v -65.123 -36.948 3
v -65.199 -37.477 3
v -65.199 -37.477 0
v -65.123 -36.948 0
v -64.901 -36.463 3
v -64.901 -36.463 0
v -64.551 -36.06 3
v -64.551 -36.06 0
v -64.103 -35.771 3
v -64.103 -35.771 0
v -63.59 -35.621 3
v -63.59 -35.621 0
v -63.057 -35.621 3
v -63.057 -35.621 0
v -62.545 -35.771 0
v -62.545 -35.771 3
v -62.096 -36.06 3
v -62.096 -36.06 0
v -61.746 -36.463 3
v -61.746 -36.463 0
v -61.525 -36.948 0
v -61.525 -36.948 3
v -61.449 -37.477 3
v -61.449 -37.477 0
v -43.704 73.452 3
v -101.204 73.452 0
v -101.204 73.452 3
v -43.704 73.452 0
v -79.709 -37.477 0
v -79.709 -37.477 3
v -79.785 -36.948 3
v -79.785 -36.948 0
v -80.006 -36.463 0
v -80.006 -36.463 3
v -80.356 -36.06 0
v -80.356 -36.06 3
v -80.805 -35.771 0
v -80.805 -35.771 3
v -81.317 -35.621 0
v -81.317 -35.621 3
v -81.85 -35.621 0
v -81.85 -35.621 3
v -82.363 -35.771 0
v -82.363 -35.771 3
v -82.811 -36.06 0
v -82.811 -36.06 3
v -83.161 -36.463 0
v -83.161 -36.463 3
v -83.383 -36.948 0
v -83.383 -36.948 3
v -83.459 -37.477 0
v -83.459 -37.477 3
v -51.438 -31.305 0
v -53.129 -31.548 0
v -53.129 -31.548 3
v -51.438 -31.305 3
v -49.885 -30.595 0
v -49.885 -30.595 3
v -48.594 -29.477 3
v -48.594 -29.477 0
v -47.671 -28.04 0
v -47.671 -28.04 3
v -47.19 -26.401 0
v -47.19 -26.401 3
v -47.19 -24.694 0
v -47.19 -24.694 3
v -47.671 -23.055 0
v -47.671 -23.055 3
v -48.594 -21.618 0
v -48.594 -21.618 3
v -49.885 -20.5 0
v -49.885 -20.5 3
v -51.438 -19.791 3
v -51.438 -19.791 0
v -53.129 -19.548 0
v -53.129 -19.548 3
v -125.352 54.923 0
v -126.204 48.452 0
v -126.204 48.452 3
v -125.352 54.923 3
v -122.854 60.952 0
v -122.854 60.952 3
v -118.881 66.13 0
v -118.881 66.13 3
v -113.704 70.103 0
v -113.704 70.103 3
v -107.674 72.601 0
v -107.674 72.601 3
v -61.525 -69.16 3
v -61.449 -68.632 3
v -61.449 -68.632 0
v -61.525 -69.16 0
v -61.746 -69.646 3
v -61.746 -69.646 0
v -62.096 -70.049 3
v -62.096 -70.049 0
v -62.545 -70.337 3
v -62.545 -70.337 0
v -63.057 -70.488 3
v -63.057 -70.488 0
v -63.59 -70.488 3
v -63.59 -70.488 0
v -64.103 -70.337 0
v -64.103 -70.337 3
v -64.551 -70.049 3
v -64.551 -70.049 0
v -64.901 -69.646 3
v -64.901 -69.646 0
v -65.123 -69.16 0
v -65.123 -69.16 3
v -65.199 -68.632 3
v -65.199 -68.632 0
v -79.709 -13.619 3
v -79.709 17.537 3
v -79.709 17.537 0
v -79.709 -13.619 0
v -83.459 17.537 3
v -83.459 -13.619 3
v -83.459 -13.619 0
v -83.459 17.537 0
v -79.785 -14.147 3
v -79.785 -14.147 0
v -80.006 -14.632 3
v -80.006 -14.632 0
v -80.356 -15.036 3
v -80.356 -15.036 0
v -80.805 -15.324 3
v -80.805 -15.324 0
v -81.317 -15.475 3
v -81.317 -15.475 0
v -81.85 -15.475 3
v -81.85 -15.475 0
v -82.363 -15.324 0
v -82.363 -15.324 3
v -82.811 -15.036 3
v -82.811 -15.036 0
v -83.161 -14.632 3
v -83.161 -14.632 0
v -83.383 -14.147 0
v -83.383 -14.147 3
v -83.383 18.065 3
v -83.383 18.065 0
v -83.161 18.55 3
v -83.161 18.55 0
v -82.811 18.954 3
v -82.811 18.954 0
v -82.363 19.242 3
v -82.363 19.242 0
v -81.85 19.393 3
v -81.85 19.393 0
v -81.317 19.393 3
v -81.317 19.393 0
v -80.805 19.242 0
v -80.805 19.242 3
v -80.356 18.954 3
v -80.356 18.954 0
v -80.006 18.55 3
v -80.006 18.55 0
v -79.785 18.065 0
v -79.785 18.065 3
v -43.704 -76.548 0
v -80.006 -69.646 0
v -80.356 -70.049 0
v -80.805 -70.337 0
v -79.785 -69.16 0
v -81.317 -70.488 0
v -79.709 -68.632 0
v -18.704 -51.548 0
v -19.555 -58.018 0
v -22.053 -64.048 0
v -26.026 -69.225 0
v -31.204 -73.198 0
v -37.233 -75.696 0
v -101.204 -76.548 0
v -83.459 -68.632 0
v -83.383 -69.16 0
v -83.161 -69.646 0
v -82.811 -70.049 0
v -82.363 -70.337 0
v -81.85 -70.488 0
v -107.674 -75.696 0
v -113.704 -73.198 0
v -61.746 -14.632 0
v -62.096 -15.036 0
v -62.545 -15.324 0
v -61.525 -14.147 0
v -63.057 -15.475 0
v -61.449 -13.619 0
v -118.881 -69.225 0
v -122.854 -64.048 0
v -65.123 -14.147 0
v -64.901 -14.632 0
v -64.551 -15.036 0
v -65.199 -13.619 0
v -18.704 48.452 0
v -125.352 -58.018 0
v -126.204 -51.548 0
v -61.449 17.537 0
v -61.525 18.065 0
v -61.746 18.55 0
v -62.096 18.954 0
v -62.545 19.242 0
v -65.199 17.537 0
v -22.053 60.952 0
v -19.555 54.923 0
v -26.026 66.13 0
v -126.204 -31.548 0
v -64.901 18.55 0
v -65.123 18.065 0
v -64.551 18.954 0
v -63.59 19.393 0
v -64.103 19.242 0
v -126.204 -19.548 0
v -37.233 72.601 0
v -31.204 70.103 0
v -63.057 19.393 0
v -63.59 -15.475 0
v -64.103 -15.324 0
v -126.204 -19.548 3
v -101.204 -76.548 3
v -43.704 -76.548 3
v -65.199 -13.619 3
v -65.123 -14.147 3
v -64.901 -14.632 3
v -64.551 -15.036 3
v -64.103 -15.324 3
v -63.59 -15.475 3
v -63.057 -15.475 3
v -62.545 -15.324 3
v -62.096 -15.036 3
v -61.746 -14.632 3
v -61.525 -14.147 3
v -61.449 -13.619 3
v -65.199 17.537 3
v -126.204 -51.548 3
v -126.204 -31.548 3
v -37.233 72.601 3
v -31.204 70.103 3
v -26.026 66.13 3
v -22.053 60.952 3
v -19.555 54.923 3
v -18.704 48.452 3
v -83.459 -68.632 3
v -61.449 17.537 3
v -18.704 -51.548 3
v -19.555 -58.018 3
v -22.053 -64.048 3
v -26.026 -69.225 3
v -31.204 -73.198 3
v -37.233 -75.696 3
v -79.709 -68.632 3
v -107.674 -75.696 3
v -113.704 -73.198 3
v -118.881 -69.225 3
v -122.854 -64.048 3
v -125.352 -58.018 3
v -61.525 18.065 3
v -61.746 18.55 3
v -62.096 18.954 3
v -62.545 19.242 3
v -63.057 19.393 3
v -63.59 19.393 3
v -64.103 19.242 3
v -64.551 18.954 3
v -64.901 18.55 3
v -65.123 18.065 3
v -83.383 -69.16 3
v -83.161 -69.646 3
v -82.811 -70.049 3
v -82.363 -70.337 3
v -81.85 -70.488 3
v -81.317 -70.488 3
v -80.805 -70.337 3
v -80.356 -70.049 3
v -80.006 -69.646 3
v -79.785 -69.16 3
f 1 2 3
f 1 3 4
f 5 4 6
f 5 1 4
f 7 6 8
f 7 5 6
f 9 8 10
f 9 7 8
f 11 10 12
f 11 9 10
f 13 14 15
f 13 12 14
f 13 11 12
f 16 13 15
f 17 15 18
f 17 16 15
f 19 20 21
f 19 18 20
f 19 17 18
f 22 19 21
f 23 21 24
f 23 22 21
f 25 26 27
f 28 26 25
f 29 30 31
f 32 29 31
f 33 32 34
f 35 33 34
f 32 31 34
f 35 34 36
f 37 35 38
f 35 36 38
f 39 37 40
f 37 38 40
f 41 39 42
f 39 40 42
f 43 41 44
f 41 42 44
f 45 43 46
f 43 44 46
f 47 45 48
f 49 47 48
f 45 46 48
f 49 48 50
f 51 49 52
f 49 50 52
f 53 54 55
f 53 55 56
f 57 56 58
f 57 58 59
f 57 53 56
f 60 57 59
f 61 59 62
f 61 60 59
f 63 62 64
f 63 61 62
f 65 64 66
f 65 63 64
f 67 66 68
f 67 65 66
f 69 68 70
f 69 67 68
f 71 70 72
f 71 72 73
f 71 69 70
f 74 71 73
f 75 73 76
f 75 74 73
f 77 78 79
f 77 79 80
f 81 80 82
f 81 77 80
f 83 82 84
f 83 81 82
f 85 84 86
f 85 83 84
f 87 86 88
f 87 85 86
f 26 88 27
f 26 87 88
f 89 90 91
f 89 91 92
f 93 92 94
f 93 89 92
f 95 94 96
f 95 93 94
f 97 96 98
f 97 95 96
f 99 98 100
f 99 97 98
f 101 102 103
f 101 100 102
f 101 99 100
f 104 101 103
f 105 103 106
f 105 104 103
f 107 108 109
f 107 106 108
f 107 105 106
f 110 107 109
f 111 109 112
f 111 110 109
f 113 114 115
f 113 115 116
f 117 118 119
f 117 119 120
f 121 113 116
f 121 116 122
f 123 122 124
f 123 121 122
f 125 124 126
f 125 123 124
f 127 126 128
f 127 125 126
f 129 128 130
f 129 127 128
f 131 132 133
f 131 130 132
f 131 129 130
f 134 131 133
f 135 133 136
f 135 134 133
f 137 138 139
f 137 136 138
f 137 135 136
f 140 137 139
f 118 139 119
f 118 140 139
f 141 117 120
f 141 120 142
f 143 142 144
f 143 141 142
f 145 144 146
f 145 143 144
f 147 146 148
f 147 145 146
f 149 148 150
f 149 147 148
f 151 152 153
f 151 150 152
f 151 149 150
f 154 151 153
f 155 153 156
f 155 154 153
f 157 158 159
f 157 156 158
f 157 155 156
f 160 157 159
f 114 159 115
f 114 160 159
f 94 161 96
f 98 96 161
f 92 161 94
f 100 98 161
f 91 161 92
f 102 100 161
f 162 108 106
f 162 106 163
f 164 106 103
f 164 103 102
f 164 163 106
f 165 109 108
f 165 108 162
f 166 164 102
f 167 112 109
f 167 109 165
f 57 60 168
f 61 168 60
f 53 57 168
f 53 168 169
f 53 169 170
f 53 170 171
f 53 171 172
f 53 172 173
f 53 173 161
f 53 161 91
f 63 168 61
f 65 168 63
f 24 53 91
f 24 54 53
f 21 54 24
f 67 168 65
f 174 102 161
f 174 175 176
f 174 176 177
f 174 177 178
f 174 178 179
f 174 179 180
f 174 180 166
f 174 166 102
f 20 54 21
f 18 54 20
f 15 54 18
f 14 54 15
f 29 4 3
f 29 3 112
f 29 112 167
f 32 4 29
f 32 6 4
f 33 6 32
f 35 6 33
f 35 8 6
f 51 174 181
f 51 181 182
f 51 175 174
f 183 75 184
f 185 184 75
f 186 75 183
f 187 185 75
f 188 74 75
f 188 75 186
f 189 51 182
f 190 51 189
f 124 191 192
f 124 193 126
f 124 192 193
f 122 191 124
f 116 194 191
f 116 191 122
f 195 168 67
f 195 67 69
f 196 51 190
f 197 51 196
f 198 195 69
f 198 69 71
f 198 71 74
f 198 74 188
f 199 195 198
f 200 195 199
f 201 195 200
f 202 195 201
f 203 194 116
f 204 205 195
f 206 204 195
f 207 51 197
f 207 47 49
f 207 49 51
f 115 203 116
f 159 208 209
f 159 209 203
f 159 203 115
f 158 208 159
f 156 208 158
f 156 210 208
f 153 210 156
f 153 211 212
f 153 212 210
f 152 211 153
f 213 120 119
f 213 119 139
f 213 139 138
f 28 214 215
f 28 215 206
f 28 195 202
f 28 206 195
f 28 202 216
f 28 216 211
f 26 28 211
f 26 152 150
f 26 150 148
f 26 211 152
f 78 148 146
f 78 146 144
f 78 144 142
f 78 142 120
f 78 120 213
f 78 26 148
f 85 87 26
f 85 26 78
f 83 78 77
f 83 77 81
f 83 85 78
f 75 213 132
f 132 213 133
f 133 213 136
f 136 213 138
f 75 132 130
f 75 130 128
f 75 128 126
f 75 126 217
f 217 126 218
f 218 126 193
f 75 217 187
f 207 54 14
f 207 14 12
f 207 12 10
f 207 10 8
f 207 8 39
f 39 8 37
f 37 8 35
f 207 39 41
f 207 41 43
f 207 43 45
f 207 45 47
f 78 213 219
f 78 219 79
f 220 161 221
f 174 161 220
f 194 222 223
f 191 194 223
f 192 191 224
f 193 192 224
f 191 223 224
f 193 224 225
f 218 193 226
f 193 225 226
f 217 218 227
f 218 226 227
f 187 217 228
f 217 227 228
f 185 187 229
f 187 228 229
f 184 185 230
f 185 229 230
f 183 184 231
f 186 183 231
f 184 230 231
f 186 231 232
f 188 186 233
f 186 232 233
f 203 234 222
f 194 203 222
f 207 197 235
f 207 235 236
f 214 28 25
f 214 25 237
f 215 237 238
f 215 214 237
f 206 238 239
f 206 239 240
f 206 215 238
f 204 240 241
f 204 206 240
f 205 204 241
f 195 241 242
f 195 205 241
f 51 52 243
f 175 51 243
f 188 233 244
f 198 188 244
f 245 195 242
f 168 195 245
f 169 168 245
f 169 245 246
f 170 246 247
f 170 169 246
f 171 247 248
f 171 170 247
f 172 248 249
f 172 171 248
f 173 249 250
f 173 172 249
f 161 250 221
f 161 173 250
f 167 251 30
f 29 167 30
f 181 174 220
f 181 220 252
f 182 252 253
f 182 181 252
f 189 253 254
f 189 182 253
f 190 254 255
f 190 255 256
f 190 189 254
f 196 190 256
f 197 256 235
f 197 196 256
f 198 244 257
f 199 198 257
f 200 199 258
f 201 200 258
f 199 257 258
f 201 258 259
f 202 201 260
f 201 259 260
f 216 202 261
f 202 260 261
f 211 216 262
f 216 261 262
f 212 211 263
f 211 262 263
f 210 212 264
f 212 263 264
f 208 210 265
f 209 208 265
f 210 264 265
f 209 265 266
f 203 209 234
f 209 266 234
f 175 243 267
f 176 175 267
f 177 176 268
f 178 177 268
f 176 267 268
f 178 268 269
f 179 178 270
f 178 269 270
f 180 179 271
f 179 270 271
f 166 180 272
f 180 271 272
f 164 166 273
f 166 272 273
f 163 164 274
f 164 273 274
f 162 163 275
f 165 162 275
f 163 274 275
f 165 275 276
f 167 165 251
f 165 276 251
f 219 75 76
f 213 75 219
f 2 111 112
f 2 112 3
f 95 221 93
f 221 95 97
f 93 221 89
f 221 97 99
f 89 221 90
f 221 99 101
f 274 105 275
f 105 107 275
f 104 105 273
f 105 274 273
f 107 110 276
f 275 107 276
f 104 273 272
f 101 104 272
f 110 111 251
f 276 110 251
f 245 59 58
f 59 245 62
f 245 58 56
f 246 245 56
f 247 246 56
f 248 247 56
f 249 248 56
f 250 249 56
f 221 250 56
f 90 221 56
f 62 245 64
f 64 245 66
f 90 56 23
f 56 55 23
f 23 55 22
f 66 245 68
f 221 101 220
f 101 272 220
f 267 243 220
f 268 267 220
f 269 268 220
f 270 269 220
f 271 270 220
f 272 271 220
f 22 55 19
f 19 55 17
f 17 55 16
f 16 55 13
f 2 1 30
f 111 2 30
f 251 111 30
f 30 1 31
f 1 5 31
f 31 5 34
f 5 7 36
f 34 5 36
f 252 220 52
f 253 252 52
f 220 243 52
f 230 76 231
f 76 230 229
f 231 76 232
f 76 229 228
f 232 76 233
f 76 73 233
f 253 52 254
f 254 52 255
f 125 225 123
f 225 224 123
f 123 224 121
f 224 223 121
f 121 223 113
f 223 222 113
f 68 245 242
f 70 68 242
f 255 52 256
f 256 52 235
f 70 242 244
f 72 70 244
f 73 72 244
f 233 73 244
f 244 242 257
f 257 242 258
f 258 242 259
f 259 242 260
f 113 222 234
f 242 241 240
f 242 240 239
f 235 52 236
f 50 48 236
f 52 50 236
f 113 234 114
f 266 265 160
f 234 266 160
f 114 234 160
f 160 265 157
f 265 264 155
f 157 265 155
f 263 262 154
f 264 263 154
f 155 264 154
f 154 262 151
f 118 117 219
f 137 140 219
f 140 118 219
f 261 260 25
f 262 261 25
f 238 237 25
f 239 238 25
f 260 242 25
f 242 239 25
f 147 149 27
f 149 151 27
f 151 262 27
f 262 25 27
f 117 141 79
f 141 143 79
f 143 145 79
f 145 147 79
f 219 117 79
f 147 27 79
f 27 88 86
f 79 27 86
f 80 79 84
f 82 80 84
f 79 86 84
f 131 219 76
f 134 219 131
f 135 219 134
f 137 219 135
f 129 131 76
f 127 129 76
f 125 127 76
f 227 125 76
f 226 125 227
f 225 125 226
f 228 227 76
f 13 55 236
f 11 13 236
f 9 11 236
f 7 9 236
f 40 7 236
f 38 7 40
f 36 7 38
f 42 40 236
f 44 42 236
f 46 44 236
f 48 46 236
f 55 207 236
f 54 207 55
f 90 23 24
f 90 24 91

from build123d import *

# Parameters (mm, degrees)
BOSS_EXTRUDE1_DEPTH = 3
CUT_EXTRUDE1_DEPTH  = 10


with BuildPart() as part:
    # Sketch2 → Boss-Extrude1 (new body)
    with BuildSketch(Plane.XY):
        with BuildLine():
            Line((-53.128634422, -19.547588701), (-62.746809975, -19.547588701))
            Line((-62.746809975, -19.547588701), (-126.203620945, -19.547588701))
            Line((-126.203620945, -19.547588701), (-126.203620945, 48.452411299))
            ThreePointArc((-126.203620945, 48.452411299), (-118.881290474, 66.130080829), (-101.203620945, 73.452411299))
            Line((-101.203620945, 73.452411299), (-43.703620945, 73.452411299))
            ThreePointArc((-43.703620945, 73.452411299), (-26.025951415, 66.130080829), (-18.703620945, 48.452411299))
            Line((-18.703620945, 48.452411299), (-18.703620945, -51.547588701))
            ThreePointArc((-18.703620945, -51.547588701), (-26.025951415, -69.225258231), (-43.703620945, -76.547588701))
            Line((-43.703620945, -76.547588701), (-101.203620945, -76.547588701))
            ThreePointArc((-101.203620945, -76.547588701), (-118.881290474, -69.225258231), (-126.203620945, -51.547588701))
            Line((-126.203620945, -51.547588701), (-126.203620945, -31.547588701))
            Line((-126.203620945, -31.547588701), (-62.746809975, -31.547588701))
            Line((-62.746809975, -31.547588701), (-53.128634422, -31.547588701))
            ThreePointArc((-53.128634422, -31.547588701), (-47.128634422, -25.547588701), (-53.128634422, -19.547588701))
        make_face()
    extrude(amount=BOSS_EXTRUDE1_DEPTH)

    # Sketch3 → Cut-Extrude1 (cut)
    with BuildSketch(Plane.XY.offset(3)):
        with BuildLine():
            Line((-61.448620945, -37.476562772), (-61.448620945, -68.6318397))
            ThreePointArc((-61.448620945, -68.6318397), (-63.323620945, -70.5068397), (-65.198620945, -68.6318397))
            Line((-65.198620945, -68.6318397), (-65.198620945, -37.476562772))
            ThreePointArc((-65.198620945, -37.476562772), (-63.323620945, -35.601562772), (-61.448620945, -37.476562772))
        make_face()
        with BuildLine():
            Line((-83.458620945, -37.476562772), (-83.458620945, -68.6318397))
            ThreePointArc((-83.458620945, -68.6318397), (-81.583620945, -70.5068397), (-79.708620945, -68.6318397))
            Line((-79.708620945, -68.6318397), (-79.708620945, -37.476562772))
            ThreePointArc((-79.708620945, -37.476562772), (-81.583620945, -35.601562772), (-83.458620945, -37.476562772))
        make_face()
        with BuildLine():
            Line((-83.458620945, -13.61861463), (-83.458620945, 17.536662297))
            ThreePointArc((-83.458620945, 17.536662297), (-81.583620945, 19.411662297), (-79.708620945, 17.536662297))
            Line((-79.708620945, 17.536662297), (-79.708620945, -13.61861463))
            ThreePointArc((-79.708620945, -13.61861463), (-81.583620945, -15.49361463), (-83.458620945, -13.61861463))
        make_face()
        with BuildLine():
            Line((-61.448620945, -13.61861463), (-61.448620945, 17.536662297))
            ThreePointArc((-61.448620945, 17.536662297), (-63.323620945, 19.411662297), (-65.198620945, 17.536662297))
            Line((-65.198620945, 17.536662297), (-65.198620945, -13.61861463))
            ThreePointArc((-65.198620945, -13.61861463), (-63.323620945, -15.49361463), (-61.448620945, -13.61861463))
        make_face()
    extrude(amount=-CUT_EXTRUDE1_DEPTH, mode=Mode.SUBTRACT)


solid = part.part
